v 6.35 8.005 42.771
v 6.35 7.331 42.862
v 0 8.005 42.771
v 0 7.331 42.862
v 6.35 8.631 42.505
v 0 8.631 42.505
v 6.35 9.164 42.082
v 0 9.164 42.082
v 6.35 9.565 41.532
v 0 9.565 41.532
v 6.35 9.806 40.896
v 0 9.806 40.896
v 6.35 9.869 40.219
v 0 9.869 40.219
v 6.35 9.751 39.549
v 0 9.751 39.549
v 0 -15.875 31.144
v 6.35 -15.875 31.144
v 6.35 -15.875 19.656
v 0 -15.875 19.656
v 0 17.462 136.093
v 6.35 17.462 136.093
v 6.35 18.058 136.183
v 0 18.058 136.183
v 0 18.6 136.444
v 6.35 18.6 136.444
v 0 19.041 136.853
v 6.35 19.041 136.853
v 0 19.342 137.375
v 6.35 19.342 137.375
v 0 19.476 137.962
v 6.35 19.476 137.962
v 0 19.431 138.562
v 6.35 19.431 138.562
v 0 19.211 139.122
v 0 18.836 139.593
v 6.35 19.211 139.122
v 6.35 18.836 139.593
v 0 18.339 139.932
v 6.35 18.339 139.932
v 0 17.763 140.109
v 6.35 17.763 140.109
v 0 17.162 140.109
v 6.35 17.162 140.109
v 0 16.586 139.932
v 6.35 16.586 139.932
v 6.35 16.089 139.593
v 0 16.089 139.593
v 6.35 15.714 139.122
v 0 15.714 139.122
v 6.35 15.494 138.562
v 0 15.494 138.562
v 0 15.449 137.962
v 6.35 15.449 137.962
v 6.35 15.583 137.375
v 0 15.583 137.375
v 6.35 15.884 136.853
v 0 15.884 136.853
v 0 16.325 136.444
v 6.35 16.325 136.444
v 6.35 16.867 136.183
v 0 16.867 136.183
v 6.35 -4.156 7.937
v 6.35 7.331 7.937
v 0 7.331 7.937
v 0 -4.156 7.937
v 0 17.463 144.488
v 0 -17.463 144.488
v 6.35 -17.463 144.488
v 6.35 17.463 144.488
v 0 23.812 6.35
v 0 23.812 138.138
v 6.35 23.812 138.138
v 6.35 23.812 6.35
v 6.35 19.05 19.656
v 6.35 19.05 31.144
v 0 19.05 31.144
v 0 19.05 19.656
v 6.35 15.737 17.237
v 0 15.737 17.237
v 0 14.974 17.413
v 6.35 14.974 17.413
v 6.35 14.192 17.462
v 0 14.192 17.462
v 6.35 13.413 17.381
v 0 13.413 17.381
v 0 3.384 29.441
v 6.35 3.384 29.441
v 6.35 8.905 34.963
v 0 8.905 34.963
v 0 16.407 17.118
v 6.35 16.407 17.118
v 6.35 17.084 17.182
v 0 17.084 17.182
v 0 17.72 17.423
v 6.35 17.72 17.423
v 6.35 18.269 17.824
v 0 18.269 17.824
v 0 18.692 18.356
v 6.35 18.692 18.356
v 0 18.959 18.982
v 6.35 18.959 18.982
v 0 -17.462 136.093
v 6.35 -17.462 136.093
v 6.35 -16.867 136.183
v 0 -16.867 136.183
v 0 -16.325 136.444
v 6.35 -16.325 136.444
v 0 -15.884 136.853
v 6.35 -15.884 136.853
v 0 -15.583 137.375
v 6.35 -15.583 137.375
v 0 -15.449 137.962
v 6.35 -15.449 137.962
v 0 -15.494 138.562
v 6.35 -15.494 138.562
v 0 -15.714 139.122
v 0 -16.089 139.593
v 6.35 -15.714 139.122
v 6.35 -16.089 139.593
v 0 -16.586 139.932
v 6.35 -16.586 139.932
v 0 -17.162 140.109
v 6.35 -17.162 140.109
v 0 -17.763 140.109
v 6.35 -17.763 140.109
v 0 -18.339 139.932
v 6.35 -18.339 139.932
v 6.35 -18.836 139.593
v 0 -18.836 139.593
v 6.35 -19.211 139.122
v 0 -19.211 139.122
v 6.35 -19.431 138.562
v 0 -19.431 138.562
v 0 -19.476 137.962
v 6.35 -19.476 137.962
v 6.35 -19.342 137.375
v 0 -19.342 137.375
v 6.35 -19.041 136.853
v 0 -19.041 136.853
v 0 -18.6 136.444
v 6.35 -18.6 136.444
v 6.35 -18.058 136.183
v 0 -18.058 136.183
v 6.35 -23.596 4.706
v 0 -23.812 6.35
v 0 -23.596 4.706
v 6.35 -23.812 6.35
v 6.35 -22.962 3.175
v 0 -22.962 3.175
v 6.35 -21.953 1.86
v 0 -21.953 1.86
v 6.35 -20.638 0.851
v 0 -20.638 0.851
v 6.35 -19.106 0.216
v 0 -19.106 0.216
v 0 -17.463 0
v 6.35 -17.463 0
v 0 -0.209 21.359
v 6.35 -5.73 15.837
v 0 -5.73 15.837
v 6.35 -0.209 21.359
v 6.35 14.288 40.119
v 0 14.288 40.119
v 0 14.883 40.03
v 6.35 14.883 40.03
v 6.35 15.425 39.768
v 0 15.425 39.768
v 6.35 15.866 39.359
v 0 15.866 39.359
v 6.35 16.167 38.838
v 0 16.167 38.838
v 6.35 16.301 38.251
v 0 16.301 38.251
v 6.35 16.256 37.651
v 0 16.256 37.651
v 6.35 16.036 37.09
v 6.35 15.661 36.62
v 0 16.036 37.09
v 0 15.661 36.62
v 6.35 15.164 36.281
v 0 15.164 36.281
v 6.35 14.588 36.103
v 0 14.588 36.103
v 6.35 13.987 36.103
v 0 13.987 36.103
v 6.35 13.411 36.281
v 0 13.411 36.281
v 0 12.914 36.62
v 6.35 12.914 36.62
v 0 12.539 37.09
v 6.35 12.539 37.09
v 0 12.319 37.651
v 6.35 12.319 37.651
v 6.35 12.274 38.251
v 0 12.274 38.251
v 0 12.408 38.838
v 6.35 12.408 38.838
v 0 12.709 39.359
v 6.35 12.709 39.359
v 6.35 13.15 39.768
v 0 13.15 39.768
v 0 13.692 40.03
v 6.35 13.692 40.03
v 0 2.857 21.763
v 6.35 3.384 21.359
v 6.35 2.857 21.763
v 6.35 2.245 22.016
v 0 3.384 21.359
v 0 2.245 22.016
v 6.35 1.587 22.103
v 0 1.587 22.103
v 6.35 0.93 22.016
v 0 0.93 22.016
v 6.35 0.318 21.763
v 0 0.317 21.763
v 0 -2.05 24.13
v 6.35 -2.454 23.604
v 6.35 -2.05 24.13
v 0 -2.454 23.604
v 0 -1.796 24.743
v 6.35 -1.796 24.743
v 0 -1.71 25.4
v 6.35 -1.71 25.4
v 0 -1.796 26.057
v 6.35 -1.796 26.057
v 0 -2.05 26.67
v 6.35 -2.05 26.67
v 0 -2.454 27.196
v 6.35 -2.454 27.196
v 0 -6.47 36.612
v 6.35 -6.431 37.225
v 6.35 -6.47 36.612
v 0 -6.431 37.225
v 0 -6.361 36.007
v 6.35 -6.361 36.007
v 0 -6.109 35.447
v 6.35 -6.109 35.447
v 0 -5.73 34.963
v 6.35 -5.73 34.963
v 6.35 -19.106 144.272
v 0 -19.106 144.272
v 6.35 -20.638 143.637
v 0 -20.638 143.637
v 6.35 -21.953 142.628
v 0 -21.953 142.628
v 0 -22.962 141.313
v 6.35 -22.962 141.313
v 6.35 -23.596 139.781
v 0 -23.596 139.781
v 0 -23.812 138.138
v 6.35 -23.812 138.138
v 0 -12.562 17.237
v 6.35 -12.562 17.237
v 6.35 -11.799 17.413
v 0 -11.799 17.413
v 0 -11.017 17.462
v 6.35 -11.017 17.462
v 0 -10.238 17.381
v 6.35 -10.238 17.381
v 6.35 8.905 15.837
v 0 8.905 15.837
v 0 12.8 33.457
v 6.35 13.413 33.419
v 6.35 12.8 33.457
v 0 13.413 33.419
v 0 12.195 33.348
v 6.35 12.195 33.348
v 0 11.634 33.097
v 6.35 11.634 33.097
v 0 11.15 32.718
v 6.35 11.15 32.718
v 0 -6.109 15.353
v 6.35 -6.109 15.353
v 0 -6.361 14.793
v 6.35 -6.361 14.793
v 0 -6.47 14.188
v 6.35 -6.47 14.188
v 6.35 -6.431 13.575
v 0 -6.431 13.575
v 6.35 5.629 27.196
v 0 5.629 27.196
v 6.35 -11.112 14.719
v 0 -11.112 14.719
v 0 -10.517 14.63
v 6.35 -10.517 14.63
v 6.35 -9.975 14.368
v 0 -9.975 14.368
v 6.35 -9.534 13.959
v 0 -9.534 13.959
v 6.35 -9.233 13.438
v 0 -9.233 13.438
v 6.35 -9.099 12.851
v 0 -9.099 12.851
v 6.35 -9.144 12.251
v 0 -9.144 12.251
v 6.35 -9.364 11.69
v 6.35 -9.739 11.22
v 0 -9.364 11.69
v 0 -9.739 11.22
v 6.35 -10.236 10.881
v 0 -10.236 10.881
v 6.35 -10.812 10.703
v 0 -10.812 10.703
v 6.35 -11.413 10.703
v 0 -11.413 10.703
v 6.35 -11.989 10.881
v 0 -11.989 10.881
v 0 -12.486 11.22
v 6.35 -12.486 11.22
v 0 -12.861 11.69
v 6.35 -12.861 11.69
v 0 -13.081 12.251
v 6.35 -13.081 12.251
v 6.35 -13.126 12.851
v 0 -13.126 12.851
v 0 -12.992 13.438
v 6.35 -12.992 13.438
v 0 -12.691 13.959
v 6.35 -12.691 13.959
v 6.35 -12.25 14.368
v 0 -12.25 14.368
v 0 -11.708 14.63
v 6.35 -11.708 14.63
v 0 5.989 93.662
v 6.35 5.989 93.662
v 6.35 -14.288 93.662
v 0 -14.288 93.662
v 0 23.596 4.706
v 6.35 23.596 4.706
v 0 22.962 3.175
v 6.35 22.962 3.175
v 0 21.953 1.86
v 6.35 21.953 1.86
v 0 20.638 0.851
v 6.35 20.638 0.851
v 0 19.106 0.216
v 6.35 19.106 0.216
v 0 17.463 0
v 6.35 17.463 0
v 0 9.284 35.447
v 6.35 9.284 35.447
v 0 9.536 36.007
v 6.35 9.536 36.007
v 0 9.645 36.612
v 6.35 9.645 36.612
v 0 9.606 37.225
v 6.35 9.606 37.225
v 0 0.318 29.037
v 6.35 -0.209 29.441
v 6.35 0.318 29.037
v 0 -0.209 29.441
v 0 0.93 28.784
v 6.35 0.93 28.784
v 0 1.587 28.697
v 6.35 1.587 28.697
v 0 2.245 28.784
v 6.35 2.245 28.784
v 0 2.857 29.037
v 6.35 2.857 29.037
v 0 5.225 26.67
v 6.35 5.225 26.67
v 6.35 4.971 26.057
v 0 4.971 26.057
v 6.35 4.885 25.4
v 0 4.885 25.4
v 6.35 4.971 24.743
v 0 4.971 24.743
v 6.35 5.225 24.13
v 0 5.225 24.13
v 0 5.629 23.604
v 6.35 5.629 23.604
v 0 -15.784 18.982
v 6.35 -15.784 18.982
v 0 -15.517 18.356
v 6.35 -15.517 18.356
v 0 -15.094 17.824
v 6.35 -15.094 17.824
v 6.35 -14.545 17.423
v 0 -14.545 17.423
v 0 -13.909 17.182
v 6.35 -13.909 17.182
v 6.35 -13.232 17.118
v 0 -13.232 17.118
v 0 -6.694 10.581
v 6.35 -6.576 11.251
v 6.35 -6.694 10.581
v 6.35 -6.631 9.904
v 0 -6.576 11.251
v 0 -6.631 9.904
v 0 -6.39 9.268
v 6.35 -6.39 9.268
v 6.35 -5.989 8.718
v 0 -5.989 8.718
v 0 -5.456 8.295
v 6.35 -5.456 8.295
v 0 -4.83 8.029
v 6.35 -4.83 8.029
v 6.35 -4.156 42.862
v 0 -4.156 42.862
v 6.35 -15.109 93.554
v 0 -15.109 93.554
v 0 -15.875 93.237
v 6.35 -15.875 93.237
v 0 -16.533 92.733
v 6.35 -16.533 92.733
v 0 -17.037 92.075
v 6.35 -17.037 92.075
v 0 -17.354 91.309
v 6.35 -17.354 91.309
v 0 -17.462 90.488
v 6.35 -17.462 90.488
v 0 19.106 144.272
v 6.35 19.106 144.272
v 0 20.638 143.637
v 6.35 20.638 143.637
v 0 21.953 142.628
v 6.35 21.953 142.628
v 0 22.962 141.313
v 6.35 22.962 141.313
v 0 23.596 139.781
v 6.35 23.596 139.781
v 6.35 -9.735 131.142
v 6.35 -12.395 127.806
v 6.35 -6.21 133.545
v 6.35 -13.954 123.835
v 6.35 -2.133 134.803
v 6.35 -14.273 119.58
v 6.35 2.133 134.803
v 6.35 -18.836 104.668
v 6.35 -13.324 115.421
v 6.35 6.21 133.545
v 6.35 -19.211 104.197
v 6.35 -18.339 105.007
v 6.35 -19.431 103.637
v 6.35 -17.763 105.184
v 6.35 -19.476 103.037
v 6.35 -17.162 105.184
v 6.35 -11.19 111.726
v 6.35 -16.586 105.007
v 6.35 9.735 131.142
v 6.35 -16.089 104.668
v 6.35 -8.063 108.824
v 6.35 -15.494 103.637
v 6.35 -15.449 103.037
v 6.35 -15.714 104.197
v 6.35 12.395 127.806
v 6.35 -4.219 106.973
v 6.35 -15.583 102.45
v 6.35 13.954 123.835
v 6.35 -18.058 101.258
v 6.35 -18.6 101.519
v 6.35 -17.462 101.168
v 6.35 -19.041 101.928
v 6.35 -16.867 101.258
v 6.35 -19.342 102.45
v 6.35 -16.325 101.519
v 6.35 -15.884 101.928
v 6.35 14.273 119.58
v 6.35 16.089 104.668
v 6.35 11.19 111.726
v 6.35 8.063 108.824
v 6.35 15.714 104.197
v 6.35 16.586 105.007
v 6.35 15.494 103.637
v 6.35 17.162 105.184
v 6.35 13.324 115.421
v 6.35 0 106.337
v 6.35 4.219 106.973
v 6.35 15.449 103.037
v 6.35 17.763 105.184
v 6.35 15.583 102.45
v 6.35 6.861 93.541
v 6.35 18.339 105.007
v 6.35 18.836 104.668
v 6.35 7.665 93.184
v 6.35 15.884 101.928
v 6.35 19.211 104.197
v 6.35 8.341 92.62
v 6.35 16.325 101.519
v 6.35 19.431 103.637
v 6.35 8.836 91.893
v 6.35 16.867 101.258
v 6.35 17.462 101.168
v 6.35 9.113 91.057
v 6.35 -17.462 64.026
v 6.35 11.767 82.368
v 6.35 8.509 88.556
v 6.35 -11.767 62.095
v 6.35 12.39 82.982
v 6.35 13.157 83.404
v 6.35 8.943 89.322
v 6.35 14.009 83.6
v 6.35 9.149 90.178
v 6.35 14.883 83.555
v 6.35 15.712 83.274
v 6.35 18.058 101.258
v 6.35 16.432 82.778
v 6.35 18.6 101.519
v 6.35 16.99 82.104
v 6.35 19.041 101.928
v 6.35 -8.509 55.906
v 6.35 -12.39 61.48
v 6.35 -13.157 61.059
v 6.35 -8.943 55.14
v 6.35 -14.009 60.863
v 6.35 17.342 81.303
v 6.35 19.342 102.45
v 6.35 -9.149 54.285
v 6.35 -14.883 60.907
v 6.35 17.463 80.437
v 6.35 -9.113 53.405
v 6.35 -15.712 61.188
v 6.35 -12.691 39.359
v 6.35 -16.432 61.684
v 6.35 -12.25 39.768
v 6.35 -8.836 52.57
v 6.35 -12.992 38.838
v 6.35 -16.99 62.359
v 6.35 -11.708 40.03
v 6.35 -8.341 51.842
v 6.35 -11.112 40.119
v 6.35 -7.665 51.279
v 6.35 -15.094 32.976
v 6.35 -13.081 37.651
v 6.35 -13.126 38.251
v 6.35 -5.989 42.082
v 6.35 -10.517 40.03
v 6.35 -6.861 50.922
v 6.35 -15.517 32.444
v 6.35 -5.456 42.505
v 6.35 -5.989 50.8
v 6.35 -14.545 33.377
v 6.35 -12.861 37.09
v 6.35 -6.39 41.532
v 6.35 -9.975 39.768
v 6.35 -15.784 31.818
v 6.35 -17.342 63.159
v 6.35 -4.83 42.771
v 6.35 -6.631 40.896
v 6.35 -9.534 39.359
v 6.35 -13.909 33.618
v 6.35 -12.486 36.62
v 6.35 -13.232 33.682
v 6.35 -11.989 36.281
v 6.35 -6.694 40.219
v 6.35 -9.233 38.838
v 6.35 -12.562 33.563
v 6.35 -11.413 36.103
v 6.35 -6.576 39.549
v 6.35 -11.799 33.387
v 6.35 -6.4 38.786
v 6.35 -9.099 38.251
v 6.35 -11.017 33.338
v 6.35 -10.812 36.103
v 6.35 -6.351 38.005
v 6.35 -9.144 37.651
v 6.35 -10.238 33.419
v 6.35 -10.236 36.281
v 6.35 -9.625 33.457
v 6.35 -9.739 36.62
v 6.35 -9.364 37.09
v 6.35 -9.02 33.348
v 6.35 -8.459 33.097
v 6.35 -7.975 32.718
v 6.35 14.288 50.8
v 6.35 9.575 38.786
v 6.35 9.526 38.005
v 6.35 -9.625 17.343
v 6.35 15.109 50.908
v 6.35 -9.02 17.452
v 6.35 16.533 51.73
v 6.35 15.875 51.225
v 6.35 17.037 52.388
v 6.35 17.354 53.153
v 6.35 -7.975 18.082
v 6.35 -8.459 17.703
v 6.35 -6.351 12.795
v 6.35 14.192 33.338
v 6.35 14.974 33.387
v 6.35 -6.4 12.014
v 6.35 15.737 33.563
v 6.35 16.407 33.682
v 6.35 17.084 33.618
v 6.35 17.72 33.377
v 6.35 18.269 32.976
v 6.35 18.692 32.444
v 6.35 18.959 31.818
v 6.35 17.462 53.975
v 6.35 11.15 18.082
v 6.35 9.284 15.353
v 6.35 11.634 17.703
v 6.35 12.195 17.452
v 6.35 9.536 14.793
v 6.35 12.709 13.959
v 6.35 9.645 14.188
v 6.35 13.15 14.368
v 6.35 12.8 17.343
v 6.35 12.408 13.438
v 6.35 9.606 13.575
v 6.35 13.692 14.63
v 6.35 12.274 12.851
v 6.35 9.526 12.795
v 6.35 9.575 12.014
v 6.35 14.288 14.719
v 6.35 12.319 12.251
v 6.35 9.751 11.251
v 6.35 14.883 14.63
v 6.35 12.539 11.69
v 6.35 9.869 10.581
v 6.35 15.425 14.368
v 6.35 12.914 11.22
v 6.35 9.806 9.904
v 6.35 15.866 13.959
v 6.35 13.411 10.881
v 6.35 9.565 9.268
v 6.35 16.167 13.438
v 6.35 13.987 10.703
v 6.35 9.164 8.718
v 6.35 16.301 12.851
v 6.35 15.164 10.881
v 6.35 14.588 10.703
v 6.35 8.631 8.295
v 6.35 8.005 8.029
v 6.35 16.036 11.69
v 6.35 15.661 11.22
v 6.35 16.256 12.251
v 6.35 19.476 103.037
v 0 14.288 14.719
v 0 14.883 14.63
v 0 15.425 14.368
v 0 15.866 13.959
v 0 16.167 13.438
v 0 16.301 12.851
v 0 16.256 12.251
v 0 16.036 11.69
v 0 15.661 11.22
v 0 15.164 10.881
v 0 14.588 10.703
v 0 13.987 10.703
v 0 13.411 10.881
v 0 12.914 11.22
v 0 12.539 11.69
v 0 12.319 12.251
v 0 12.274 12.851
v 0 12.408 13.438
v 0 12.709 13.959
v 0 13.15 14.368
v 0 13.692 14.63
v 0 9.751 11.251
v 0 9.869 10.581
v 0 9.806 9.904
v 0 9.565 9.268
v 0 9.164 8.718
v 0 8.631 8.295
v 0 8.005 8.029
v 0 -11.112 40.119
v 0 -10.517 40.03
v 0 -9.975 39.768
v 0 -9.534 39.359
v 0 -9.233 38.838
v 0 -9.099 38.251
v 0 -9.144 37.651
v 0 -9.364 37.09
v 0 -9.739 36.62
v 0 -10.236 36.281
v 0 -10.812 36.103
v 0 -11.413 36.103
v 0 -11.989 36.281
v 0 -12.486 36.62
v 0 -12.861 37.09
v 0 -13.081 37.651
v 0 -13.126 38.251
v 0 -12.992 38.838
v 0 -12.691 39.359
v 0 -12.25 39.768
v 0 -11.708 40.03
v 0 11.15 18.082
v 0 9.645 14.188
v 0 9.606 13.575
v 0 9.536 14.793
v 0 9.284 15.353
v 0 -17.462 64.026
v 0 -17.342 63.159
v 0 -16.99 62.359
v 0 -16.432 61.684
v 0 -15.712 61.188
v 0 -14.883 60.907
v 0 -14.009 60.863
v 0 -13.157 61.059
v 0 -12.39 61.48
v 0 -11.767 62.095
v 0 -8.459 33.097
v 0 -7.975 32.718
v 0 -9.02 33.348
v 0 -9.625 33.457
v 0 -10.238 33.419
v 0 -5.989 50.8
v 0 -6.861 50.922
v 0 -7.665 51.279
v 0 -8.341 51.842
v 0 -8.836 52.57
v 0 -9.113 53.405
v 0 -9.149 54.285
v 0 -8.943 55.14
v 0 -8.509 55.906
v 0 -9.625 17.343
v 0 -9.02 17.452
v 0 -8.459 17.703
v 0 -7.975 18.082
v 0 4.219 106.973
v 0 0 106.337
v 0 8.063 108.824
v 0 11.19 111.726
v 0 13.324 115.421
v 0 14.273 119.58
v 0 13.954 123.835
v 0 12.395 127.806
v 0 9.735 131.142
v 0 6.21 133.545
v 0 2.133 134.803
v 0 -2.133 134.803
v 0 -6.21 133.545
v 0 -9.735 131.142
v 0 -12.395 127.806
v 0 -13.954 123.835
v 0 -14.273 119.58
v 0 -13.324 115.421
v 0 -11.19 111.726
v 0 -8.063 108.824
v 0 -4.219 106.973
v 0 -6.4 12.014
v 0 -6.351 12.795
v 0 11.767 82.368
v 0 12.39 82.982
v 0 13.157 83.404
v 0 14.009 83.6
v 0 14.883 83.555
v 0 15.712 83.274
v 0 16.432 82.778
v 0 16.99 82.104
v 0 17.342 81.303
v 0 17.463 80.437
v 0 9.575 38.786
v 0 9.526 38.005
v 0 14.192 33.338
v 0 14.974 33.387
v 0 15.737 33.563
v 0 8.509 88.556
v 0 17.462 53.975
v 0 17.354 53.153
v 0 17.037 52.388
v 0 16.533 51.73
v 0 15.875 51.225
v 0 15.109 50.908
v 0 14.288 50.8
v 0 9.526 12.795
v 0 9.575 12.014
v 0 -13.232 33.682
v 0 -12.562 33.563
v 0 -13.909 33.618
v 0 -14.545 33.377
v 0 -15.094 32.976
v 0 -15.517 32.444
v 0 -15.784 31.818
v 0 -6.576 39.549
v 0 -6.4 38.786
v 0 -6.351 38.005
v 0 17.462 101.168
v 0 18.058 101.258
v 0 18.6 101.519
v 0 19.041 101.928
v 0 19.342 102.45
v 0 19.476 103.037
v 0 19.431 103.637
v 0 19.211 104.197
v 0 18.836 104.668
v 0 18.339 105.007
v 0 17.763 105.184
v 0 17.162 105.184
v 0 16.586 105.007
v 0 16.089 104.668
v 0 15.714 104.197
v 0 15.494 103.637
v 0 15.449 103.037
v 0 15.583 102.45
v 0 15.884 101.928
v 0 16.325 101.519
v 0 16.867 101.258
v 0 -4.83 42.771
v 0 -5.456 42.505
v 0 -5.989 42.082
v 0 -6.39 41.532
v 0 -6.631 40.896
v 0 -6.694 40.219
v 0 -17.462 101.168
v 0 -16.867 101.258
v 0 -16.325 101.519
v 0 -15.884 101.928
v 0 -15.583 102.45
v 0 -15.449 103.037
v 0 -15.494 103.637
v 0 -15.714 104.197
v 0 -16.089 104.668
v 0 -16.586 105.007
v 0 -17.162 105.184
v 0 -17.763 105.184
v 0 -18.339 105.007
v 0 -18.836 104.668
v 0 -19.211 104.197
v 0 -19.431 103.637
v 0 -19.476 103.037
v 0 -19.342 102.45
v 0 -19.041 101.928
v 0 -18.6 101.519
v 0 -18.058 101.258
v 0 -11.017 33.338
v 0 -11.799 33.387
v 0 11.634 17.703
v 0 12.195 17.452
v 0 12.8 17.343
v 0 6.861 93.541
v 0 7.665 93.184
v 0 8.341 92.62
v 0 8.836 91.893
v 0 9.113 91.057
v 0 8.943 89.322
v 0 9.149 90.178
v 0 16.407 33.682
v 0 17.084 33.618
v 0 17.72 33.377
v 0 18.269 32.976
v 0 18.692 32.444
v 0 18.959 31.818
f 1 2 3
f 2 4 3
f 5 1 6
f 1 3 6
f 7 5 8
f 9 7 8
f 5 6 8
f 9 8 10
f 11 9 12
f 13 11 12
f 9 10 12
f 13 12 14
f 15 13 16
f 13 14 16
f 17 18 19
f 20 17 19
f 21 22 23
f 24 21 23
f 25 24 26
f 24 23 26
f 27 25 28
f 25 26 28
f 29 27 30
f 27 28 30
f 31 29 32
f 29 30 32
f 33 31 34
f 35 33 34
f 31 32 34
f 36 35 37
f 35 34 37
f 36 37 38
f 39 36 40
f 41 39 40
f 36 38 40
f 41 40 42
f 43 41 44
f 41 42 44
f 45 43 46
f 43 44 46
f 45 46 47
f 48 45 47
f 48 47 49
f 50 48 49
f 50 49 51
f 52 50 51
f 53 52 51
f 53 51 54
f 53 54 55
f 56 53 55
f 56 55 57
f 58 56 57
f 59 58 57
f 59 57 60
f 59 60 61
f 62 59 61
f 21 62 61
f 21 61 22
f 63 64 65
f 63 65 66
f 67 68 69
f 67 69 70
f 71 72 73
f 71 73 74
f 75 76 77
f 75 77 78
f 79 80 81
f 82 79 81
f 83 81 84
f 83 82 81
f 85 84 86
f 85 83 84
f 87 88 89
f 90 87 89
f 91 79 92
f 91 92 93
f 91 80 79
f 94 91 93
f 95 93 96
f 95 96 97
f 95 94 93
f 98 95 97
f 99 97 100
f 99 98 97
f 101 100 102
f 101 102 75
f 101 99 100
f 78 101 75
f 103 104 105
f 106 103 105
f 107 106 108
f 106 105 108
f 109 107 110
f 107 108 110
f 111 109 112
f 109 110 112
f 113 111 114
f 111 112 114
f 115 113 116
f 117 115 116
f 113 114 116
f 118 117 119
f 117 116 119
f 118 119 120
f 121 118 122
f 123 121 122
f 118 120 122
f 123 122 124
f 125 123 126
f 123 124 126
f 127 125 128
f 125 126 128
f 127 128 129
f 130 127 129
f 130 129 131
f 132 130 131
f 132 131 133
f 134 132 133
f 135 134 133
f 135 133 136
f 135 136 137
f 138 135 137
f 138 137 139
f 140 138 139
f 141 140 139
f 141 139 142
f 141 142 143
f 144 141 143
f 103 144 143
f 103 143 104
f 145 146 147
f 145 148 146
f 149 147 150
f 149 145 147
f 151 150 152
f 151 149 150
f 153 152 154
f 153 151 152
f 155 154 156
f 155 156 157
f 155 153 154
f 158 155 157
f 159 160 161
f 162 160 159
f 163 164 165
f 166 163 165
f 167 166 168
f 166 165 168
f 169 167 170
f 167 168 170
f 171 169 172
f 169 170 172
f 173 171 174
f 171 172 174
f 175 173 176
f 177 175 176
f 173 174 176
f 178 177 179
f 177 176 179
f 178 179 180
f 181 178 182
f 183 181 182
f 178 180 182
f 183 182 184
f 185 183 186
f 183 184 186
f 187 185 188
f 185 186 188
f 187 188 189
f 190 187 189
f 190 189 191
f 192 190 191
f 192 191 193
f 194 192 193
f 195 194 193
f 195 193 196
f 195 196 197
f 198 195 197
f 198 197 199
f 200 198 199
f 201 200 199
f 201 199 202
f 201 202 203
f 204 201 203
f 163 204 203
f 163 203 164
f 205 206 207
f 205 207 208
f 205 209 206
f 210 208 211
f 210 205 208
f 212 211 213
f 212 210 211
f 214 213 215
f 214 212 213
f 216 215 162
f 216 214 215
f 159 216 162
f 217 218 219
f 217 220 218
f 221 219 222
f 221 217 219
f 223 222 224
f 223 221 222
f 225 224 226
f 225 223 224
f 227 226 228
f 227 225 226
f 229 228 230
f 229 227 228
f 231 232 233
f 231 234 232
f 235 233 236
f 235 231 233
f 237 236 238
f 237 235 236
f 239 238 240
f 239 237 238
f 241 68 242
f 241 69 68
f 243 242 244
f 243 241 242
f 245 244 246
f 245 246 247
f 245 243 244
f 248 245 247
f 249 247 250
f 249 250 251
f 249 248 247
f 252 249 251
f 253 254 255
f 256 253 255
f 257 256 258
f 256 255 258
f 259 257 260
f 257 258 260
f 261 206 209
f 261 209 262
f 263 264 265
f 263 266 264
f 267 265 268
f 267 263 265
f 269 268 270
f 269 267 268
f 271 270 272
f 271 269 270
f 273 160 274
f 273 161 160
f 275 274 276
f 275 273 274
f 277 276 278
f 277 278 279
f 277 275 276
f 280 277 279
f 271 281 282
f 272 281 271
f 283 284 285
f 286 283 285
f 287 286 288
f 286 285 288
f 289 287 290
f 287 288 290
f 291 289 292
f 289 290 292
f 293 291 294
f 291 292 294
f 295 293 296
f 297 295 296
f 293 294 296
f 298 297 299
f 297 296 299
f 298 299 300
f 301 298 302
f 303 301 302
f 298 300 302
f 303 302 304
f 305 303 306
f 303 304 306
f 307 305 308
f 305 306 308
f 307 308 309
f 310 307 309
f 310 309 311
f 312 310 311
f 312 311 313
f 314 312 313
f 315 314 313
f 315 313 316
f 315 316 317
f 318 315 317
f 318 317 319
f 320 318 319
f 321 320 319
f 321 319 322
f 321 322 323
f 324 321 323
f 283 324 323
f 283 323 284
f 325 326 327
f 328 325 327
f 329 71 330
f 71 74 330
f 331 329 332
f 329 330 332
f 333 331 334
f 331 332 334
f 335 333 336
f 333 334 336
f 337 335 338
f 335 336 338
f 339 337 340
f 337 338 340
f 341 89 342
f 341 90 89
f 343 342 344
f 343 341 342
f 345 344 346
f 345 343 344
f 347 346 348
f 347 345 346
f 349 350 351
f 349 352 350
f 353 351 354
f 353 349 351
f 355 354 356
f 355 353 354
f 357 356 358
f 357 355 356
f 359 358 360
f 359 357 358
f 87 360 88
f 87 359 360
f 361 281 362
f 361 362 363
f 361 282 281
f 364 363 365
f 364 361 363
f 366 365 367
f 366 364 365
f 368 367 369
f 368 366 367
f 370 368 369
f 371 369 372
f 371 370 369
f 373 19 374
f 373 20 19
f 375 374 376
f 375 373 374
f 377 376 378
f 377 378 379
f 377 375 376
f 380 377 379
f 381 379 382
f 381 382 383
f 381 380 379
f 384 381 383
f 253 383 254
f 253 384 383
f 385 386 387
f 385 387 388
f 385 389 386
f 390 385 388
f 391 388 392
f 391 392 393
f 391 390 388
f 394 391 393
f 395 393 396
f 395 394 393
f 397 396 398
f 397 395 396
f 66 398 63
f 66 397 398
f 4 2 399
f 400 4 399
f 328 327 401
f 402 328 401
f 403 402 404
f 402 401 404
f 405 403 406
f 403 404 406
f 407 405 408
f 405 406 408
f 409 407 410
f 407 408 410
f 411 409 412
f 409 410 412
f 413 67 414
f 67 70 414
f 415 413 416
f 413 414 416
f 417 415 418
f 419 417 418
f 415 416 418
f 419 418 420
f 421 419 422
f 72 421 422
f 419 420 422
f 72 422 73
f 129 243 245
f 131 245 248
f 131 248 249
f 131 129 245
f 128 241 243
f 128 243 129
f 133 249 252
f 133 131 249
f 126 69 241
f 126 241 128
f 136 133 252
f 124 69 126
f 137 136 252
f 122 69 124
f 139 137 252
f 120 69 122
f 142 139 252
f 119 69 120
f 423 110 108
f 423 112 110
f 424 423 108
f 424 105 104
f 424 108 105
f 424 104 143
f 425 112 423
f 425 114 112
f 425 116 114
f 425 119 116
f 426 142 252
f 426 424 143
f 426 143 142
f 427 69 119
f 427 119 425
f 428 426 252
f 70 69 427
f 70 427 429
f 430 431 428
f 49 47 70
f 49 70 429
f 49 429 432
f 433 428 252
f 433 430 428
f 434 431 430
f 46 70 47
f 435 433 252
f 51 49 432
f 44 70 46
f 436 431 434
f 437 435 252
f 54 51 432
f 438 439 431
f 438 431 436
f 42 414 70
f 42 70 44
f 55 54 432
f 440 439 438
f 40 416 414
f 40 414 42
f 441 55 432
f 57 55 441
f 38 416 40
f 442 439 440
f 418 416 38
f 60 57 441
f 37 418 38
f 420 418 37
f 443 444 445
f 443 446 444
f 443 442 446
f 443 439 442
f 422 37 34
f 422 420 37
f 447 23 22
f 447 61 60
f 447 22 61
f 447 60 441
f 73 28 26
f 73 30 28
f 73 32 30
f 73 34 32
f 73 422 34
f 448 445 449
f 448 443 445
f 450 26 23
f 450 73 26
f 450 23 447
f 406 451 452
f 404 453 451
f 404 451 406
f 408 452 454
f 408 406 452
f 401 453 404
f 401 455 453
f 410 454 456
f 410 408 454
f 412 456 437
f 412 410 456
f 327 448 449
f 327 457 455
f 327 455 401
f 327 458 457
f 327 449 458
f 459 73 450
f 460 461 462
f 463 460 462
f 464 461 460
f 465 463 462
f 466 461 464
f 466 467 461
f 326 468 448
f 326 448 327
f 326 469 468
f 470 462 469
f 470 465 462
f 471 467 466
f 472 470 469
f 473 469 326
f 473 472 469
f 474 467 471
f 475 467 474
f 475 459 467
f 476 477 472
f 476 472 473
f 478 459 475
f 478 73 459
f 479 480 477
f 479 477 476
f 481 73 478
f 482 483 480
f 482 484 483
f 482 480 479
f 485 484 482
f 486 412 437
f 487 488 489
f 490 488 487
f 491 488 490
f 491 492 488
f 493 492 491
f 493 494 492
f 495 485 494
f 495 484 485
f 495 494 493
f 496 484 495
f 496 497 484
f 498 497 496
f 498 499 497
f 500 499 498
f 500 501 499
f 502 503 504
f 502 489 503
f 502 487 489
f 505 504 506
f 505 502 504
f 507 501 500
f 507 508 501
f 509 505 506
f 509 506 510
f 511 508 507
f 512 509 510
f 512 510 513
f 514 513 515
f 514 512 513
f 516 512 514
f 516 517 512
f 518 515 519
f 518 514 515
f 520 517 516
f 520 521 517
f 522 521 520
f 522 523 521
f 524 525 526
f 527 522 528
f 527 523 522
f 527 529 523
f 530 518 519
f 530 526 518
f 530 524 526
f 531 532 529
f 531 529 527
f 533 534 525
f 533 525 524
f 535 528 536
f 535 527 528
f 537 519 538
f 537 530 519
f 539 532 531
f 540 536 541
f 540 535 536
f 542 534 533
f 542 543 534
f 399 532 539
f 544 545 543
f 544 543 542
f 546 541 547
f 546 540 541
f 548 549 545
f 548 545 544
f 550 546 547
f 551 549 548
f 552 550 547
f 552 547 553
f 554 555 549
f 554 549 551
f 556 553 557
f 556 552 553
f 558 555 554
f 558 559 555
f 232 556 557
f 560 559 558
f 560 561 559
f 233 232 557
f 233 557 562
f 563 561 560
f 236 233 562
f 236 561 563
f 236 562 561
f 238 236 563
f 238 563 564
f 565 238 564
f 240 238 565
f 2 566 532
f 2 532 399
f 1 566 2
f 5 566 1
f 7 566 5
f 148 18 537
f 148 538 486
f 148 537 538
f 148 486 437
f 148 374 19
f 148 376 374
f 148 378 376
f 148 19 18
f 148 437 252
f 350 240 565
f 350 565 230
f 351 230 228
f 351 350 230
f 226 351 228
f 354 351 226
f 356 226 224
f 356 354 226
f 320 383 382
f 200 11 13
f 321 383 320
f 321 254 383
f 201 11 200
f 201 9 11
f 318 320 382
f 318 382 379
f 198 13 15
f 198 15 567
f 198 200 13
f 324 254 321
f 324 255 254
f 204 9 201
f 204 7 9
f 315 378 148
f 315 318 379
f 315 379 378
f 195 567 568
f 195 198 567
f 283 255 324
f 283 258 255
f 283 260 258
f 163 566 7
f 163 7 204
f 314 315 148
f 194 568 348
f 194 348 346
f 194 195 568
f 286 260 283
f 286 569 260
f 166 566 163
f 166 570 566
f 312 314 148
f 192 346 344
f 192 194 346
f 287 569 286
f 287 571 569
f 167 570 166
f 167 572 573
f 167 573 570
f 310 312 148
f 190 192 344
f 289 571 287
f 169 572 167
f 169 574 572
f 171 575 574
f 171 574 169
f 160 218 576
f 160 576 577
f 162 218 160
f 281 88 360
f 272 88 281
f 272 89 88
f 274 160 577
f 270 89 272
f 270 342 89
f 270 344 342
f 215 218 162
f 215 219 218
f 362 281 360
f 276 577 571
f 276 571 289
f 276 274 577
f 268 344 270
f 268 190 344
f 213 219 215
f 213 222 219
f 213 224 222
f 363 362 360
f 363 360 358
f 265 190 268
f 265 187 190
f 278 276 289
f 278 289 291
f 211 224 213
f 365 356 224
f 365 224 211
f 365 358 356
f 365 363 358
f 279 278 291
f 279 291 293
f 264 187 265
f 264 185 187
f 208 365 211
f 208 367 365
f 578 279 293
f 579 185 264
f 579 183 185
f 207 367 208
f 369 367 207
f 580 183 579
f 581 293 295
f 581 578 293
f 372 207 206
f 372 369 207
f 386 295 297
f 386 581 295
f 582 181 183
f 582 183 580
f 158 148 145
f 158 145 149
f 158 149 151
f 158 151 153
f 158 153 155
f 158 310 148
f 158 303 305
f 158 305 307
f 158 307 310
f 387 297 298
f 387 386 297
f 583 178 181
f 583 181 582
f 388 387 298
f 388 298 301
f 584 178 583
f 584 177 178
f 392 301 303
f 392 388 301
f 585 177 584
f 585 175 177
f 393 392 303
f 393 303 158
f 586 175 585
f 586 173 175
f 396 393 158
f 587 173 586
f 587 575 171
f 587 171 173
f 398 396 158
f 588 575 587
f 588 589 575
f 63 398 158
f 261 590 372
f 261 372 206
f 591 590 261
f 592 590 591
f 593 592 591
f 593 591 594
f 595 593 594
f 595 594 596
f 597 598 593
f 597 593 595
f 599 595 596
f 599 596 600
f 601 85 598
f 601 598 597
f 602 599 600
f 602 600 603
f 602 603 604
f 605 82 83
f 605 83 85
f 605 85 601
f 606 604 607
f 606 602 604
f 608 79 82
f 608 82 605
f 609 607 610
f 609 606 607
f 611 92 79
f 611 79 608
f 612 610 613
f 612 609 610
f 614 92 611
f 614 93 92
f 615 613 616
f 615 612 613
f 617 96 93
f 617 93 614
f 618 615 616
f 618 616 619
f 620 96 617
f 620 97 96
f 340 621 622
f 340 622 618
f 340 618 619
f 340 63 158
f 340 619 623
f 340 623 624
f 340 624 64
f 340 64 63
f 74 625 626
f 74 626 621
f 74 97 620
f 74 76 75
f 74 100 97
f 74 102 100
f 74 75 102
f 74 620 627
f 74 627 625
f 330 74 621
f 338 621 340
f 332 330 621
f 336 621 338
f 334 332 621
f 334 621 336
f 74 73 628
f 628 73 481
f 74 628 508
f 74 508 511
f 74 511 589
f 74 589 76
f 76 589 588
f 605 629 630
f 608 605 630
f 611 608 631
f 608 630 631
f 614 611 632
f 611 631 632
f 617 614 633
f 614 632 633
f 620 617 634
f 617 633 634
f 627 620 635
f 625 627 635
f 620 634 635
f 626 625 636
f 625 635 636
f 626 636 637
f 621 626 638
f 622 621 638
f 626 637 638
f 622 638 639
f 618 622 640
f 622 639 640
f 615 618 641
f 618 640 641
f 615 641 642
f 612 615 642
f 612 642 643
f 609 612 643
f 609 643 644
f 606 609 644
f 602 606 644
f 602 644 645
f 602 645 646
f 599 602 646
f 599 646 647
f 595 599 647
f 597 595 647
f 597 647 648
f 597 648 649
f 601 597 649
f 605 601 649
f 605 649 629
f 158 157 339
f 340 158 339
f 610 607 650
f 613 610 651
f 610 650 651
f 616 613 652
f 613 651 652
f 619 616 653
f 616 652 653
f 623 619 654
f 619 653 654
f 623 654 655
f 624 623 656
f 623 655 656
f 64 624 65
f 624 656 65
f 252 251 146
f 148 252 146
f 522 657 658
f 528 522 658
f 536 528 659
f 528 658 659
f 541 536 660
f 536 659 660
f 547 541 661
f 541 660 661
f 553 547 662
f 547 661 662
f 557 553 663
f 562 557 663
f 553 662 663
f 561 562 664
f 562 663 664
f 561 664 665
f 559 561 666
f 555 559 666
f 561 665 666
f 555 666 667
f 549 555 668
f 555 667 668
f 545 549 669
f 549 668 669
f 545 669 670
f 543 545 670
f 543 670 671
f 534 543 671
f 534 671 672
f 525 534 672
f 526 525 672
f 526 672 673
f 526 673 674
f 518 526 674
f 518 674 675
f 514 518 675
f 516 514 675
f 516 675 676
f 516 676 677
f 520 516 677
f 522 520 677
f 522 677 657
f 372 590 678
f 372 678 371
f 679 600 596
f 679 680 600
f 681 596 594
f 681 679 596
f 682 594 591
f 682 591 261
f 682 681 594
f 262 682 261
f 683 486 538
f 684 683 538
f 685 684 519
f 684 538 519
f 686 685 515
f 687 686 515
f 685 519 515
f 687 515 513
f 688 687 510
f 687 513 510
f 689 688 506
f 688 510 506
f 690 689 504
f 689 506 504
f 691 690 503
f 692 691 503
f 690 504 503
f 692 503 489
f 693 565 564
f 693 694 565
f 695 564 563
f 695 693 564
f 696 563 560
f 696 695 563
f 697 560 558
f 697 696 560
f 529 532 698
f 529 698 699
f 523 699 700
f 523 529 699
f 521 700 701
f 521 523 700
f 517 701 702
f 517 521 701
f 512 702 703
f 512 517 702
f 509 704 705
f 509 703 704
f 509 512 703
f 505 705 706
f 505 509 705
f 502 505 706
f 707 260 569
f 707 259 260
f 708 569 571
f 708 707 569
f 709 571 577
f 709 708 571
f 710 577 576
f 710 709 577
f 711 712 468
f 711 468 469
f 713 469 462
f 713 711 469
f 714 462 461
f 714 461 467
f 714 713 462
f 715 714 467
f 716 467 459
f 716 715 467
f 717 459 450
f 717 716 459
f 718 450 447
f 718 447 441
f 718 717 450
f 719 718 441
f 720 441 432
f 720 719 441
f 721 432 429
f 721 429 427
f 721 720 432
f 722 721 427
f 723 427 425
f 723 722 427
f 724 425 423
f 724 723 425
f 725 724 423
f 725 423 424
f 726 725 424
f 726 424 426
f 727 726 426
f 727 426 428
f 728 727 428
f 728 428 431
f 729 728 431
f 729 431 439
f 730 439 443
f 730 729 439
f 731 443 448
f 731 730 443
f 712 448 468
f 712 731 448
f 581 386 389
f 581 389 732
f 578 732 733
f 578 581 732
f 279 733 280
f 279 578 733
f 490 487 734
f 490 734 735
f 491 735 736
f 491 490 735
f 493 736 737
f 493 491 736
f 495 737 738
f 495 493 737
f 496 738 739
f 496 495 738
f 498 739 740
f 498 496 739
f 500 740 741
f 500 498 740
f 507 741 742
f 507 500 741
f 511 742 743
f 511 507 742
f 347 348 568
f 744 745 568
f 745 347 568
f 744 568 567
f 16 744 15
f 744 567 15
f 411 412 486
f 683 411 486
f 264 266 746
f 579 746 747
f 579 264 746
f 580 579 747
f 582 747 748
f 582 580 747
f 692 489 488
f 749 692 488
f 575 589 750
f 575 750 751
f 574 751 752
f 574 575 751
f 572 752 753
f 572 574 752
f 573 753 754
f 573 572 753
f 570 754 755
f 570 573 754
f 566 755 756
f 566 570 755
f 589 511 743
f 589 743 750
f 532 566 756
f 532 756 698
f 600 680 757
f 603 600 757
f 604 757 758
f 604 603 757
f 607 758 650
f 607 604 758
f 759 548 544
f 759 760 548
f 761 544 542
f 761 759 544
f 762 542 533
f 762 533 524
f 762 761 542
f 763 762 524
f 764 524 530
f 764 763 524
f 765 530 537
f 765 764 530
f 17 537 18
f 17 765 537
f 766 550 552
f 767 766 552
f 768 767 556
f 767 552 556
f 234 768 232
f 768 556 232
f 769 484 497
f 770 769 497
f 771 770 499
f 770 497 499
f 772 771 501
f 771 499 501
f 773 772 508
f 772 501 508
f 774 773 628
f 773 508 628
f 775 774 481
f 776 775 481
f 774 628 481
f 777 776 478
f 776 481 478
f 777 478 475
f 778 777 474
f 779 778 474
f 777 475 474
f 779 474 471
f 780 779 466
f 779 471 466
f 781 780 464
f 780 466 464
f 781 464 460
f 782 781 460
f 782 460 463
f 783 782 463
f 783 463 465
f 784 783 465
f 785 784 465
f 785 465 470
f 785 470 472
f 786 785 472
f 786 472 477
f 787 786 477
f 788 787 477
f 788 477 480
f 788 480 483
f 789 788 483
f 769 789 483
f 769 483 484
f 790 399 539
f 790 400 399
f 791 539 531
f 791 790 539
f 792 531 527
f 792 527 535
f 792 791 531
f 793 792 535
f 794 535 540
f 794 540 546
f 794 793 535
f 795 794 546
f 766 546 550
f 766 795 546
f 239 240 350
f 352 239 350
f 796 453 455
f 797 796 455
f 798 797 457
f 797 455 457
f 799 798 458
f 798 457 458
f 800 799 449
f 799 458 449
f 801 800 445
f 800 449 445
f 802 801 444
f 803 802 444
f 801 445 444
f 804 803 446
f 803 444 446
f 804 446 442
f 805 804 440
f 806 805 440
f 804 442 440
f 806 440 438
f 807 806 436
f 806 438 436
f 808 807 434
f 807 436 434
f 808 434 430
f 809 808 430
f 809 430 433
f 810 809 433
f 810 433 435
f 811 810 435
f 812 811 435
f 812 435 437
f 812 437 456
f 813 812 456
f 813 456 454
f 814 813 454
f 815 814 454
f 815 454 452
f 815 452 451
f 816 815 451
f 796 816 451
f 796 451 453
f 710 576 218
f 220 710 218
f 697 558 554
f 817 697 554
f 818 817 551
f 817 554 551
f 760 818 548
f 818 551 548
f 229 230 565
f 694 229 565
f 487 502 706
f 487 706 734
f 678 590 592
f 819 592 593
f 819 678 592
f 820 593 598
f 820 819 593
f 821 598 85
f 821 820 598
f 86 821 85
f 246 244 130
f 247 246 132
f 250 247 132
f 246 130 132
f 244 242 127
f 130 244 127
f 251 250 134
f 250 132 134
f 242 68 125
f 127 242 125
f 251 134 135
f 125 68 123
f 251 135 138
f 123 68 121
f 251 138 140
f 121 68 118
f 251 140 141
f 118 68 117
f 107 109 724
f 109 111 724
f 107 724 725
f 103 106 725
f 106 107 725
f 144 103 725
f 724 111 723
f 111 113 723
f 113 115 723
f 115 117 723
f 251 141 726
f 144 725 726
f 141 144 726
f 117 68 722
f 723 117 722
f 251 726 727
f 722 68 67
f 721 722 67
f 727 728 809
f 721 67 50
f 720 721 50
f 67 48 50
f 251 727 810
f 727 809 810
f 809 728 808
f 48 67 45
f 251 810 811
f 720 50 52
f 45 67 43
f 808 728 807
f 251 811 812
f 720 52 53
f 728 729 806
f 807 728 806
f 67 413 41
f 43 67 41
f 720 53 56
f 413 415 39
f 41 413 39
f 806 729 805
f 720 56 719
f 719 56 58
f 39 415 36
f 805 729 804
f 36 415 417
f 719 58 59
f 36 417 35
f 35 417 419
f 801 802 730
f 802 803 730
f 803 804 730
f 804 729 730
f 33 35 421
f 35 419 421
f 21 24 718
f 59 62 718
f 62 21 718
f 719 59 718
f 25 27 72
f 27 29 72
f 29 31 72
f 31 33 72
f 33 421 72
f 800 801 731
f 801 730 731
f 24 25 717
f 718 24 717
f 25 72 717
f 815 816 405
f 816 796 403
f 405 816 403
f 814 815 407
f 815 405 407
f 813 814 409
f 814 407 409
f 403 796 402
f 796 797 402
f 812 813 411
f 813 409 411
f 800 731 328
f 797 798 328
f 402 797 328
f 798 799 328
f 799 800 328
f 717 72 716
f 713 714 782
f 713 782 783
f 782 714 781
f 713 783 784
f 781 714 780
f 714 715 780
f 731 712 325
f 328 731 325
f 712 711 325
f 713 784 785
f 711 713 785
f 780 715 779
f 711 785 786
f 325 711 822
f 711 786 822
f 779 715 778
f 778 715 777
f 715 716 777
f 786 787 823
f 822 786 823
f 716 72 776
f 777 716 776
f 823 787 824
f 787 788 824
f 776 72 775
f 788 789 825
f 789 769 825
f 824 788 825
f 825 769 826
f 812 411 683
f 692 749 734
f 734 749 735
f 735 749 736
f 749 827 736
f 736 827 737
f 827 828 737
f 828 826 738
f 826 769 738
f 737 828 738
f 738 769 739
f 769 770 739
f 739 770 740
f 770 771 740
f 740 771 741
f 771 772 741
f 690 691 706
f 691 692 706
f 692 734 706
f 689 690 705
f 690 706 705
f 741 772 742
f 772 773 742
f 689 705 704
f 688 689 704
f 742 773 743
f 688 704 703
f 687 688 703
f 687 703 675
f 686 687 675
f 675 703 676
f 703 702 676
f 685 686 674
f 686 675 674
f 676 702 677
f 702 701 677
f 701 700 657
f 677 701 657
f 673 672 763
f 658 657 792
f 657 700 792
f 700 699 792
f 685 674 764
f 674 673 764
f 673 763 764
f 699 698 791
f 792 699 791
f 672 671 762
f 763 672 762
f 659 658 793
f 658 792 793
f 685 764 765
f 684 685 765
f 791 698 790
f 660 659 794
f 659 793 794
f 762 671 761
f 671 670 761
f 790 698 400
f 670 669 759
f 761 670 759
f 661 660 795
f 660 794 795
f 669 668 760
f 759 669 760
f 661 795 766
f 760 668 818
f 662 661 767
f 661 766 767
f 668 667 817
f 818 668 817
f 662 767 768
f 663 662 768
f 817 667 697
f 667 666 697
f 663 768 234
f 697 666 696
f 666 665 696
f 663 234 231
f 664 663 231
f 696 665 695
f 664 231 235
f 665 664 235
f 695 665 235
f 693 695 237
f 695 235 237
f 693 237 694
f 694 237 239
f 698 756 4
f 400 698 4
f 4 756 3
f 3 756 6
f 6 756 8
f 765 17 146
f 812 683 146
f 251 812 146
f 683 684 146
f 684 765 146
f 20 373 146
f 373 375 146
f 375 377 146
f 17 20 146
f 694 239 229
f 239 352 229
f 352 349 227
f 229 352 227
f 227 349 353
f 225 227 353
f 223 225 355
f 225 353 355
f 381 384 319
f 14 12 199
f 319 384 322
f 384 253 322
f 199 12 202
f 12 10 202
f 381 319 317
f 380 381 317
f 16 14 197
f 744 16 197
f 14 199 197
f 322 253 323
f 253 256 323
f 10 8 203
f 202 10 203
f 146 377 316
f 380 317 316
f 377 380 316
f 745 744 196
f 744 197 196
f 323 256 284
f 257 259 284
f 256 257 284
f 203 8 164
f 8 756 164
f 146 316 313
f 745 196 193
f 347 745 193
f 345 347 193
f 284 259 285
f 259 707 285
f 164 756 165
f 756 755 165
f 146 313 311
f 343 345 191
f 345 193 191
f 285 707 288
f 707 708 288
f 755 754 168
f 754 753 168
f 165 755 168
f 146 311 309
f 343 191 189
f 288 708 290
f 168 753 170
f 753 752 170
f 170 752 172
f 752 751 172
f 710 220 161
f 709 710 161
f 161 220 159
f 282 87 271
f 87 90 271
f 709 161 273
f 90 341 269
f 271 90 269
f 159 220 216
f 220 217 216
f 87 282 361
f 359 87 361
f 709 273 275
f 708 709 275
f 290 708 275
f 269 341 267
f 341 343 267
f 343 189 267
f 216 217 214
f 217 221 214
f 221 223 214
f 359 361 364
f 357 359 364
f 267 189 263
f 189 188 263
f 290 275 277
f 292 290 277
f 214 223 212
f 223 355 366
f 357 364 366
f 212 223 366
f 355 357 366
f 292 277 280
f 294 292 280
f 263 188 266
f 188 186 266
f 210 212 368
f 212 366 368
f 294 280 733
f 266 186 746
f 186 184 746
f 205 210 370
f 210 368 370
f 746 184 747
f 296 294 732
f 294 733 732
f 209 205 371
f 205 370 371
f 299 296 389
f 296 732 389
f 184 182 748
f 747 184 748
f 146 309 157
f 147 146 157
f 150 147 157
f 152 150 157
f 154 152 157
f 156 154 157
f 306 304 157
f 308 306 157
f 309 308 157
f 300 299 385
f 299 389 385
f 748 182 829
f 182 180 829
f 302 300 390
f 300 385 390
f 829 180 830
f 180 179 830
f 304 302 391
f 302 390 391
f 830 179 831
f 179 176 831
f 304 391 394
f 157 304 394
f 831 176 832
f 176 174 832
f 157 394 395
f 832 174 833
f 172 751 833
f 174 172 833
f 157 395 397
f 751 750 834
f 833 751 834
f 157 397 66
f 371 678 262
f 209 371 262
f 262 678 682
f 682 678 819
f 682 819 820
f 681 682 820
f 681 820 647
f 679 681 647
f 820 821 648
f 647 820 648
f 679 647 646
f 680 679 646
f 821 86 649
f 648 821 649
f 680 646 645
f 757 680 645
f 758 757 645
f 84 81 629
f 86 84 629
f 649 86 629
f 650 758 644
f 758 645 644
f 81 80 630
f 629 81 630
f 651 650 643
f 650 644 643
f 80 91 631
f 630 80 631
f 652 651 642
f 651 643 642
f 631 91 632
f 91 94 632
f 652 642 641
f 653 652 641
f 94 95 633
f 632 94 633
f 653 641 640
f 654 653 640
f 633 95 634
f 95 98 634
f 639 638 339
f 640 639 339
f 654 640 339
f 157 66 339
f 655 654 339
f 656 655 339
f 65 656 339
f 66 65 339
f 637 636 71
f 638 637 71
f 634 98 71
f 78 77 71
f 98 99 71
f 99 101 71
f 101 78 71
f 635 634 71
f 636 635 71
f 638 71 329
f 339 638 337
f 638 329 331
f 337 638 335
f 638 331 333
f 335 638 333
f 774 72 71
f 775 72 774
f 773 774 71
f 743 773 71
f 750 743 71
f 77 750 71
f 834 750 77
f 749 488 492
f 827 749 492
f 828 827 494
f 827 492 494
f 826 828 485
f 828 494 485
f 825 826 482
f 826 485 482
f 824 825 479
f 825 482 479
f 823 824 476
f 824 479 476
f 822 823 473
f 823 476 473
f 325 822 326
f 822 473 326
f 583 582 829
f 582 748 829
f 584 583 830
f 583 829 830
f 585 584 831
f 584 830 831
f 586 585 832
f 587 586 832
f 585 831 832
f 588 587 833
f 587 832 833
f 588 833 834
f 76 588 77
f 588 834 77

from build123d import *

# Parameters (mm, degrees)
SKETCH1_W              = 144.4879
SKETCH1_H              = 47.625
SKETCH1_R              = 14.3129
BOSS_EXTRUDE1_DEPTH    = 6.35
FILLET1_R              = 6.35
F_10_32_TAPPED_HOLE1_D = 4.0386
F_10_32_TAPPED_HOLE2_D = 4.0386
CUT_EXTRUDE1_DEPTH     = 147.5745916
FILLET2_R              = 2.54


with BuildPart() as part:
    # Sketch1 → Boss-Extrude1 (new body)
    with BuildSketch(Plane(origin=(0, 0, 0), x_dir=(0, 0, -1), z_dir=(1, 0, 0))):
        with Locations((-72.24395, 0)):
            Rectangle(SKETCH1_W, SKETCH1_H)
        with Locations((-120.65, 0)):
            Circle(SKETCH1_R, mode=Mode.SUBTRACT)
    extrude(amount=BOSS_EXTRUDE1_DEPTH)

    # Fillet1
    fillet1_edges = [part.edges().sort_by_distance(p)[0] for p in [
        (3.175, -23.8125, 144.4879),
        (3.175, 23.8125, 144.4879),
        (3.175, 23.8125, 0),
        (3.175, -23.8125, 0),
    ]]
    fillet(fillet1_edges, radius=FILLET1_R)

    # #10-32 Tapped Hole1 (through all)
    with Locations(Plane.ZY):
        with Locations((103.1875, 17.4625), (138.1125, 17.4625), (138.1125, -17.4625), (103.1875, -17.4625)):
            Hole(F_10_32_TAPPED_HOLE1_D / 2)

    # #10-32 Tapped Hole2 (through all)
    with Locations(Plane(origin=(6.35, 0, 0), x_dir=(0, 0, -1), z_dir=(1, 0, 0))):
        with Locations((-12.7, 14.2875), (-38.1, 14.2875), (-38.1, -11.1125), (-12.7, -11.1125)):
            Hole(F_10_32_TAPPED_HOLE2_D / 2)

    # Sketch8 → Cut-Extrude1 (cut, through all)
    with BuildSketch(Plane(origin=(6.35, 0, 0), x_dir=(0, 0, -1), z_dir=(1, 0, 0))):
        with BuildLine():
            Line((-80.436721657, 17.4625), (-53.975, 17.4625))
            ThreePointArc((-53.975, 17.4625), (-51.72993597, 16.53256403), (-50.8, 14.2875))
            Line((-50.8, 14.2875), (-50.8, -5.989274253))
            ThreePointArc((-50.8, -5.989274253), (-52.569784121, -8.836376874), (-55.906137534, -8.509459331))
            Line((-55.906137534, -8.509459331), (-82.367859191, 11.767314922))
            ThreePointArc((-82.367859191, 11.767314922), (-83.443564904, 15.307067893), (-80.436721657, 17.4625))
        make_face()
        with BuildLine():
            Line((-93.6625, 5.989274253), (-93.6625, -14.2875))
            ThreePointArc((-93.6625, -14.2875), (-92.73256403, -16.53256403), (-90.4875, -17.4625))
            Line((-90.4875, -17.4625), (-64.025778343, -17.4625))
            ThreePointArc((-64.025778343, -17.4625), (-61.018935096, -15.307067893), (-62.094640809, -11.767314922))
            Line((-62.094640809, -11.767314922), (-88.556362466, 8.509459331))
            ThreePointArc((-88.556362466, 8.509459331), (-91.892715879, 8.836376874), (-93.6625, 5.989274253))
        make_face()
        with BuildLine():
            Line((-38.1, 19.05), (-12.7, 19.05))
            ThreePointArc((-12.7, 19.05), (-16.728416874, 16.827827486), (-16.997532015, 12.235032015))
            Line((-16.997532015, 12.235032015), (-25.4, 3.83256403))
            Line((-25.4, 3.83256403), (-33.802467985, 12.235032015))
            ThreePointArc((-33.802467985, 12.235032015), (-34.071583126, 16.827827486), (-38.1, 19.05))
        make_face()
        with BuildLine():
            Line((-7.9375, 14.2875), (-7.9375, -11.1125))
            ThreePointArc((-7.9375, -11.1125), (-10.159672514, -7.084083126), (-14.752467985, -6.814967985))
            Line((-14.752467985, -6.814967985), (-23.15493597, 1.5875))
            Line((-23.15493597, 1.5875), (-14.752467985, 9.989967985))
            ThreePointArc((-14.752467985, 9.989967985), (-10.159672514, 10.259083126), (-7.9375, 14.2875))
        make_face()
        with BuildLine():
            Line((-38.1, -15.875), (-12.7, -15.875))
            ThreePointArc((-12.7, -15.875), (-16.728416874, -13.652827486), (-16.997532015, -9.060032015))
            Line((-16.997532015, -9.060032015), (-25.4, -0.65756403))
            Line((-25.4, -0.65756403), (-33.802467985, -9.060032015))
            ThreePointArc((-33.802467985, -9.060032015), (-34.071583126, -13.652827486), (-38.1, -15.875))
        make_face()
        with BuildLine():
            Line((-42.8625, 14.2875), (-42.8625, -11.1125))
            ThreePointArc((-42.8625, -11.1125), (-40.640327486, -7.084083126), (-36.047532015, -6.814967985))
            Line((-36.047532015, -6.814967985), (-27.64506403, 1.5875))
            Line((-27.64506403, 1.5875), (-36.047532015, 9.989967985))
            ThreePointArc((-36.047532015, 9.989967985), (-40.640327486, 10.259083126), (-42.8625, 14.2875))
        make_face()
    extrude(amount=-CUT_EXTRUDE1_DEPTH, mode=Mode.SUBTRACT)

    # Fillet2
    fillet2_edges = [part.edges().sort_by_distance(p)[0] for p in [
        (3.175, -15.875, 12.7),
    ]]
    fillet(fillet2_edges, radius=FILLET2_R)
    fillet2_2_edges = [part.edges().sort_by_distance(p)[0] for p in [
        (3.175, -9.060032015, 16.997532015),
    ]]
    fillet(fillet2_2_edges, radius=FILLET2_R)
    fillet2_3_edges = [part.edges().sort_by_distance(p)[0] for p in [
        (3.175, -0.65756403, 25.4),
    ]]
    fillet(fillet2_3_edges, radius=FILLET2_R)
    fillet2_4_edges = [part.edges().sort_by_distance(p)[0] for p in [
        (3.175, -9.060032015, 33.802467985),
    ]]
    fillet(fillet2_4_edges, radius=FILLET2_R)
    fillet2_5_edges = [part.edges().sort_by_distance(p)[0] for p in [
        (3.175, 14.2875, 42.8625),
    ]]
    fillet(fillet2_5_edges, radius=FILLET2_R)
    fillet2_6_edges = [part.edges().sort_by_distance(p)[0] for p in [
        (3.175, -6.814967985, 36.047532015),
    ]]
    fillet(fillet2_6_edges, radius=FILLET2_R)
    fillet2_7_edges = [part.edges().sort_by_distance(p)[0] for p in [
        (3.175, 1.5875, 27.64506403),
    ]]
    fillet(fillet2_7_edges, radius=FILLET2_R)
    fillet2_8_edges = [part.edges().sort_by_distance(p)[0] for p in [
        (3.175, 9.989967985, 36.047532015),
    ]]
    fillet(fillet2_8_edges, radius=FILLET2_R)
    fillet2_9_edges = [part.edges().sort_by_distance(p)[0] for p in [
        (3.175, 14.2875, 7.9375),
    ]]
    fillet(fillet2_9_edges, radius=FILLET2_R)
    fillet2_10_edges = [part.edges().sort_by_distance(p)[0] for p in [
        (3.175, 9.989967985, 14.752467985),
    ]]
    fillet(fillet2_10_edges, radius=FILLET2_R)
    fillet2_11_edges = [part.edges().sort_by_distance(p)[0] for p in [
        (3.175, 1.5875, 23.15493597),
    ]]
    fillet(fillet2_11_edges, radius=FILLET2_R)
    fillet2_12_edges = [part.edges().sort_by_distance(p)[0] for p in [
        (3.175, -6.814967985, 14.752467985),
    ]]
    fillet(fillet2_12_edges, radius=FILLET2_R)
    fillet2_13_edges = [part.edges().sort_by_distance(p)[0] for p in [
        (3.175, -11.1125, 7.9375),
    ]]
    fillet(fillet2_13_edges, radius=FILLET2_R)
    fillet2_14_edges = [part.edges().sort_by_distance(p)[0] for p in [
        (3.175, 19.05, 38.1),
    ]]
    fillet(fillet2_14_edges, radius=FILLET2_R)
    fillet2_15_edges = [part.edges().sort_by_distance(p)[0] for p in [
        (3.175, 12.235032015, 33.802467985),
    ]]
    fillet(fillet2_15_edges, radius=FILLET2_R)
    fillet2_16_edges = [part.edges().sort_by_distance(p)[0] for p in [
        (3.175, 3.83256403, 25.4),
    ]]
    fillet(fillet2_16_edges, radius=FILLET2_R)
    fillet2_17_edges = [part.edges().sort_by_distance(p)[0] for p in [
        (3.175, 12.235032015, 16.997532015),
    ]]
    fillet(fillet2_17_edges, radius=FILLET2_R)
    fillet2_18_edges = [part.edges().sort_by_distance(p)[0] for p in [
        (3.175, 19.05, 12.7),
    ]]
    fillet(fillet2_18_edges, radius=FILLET2_R)
    fillet2_19_edges = [part.edges().sort_by_distance(p)[0] for p in [
        (3.175, -15.875, 38.1),
    ]]
    fillet(fillet2_19_edges, radius=FILLET2_R)
    fillet2_20_edges = [part.edges().sort_by_distance(p)[0] for p in [
        (3.175, -11.1125, 42.8625),
    ]]
    fillet(fillet2_20_edges, radius=FILLET2_R)


solid = part.part
